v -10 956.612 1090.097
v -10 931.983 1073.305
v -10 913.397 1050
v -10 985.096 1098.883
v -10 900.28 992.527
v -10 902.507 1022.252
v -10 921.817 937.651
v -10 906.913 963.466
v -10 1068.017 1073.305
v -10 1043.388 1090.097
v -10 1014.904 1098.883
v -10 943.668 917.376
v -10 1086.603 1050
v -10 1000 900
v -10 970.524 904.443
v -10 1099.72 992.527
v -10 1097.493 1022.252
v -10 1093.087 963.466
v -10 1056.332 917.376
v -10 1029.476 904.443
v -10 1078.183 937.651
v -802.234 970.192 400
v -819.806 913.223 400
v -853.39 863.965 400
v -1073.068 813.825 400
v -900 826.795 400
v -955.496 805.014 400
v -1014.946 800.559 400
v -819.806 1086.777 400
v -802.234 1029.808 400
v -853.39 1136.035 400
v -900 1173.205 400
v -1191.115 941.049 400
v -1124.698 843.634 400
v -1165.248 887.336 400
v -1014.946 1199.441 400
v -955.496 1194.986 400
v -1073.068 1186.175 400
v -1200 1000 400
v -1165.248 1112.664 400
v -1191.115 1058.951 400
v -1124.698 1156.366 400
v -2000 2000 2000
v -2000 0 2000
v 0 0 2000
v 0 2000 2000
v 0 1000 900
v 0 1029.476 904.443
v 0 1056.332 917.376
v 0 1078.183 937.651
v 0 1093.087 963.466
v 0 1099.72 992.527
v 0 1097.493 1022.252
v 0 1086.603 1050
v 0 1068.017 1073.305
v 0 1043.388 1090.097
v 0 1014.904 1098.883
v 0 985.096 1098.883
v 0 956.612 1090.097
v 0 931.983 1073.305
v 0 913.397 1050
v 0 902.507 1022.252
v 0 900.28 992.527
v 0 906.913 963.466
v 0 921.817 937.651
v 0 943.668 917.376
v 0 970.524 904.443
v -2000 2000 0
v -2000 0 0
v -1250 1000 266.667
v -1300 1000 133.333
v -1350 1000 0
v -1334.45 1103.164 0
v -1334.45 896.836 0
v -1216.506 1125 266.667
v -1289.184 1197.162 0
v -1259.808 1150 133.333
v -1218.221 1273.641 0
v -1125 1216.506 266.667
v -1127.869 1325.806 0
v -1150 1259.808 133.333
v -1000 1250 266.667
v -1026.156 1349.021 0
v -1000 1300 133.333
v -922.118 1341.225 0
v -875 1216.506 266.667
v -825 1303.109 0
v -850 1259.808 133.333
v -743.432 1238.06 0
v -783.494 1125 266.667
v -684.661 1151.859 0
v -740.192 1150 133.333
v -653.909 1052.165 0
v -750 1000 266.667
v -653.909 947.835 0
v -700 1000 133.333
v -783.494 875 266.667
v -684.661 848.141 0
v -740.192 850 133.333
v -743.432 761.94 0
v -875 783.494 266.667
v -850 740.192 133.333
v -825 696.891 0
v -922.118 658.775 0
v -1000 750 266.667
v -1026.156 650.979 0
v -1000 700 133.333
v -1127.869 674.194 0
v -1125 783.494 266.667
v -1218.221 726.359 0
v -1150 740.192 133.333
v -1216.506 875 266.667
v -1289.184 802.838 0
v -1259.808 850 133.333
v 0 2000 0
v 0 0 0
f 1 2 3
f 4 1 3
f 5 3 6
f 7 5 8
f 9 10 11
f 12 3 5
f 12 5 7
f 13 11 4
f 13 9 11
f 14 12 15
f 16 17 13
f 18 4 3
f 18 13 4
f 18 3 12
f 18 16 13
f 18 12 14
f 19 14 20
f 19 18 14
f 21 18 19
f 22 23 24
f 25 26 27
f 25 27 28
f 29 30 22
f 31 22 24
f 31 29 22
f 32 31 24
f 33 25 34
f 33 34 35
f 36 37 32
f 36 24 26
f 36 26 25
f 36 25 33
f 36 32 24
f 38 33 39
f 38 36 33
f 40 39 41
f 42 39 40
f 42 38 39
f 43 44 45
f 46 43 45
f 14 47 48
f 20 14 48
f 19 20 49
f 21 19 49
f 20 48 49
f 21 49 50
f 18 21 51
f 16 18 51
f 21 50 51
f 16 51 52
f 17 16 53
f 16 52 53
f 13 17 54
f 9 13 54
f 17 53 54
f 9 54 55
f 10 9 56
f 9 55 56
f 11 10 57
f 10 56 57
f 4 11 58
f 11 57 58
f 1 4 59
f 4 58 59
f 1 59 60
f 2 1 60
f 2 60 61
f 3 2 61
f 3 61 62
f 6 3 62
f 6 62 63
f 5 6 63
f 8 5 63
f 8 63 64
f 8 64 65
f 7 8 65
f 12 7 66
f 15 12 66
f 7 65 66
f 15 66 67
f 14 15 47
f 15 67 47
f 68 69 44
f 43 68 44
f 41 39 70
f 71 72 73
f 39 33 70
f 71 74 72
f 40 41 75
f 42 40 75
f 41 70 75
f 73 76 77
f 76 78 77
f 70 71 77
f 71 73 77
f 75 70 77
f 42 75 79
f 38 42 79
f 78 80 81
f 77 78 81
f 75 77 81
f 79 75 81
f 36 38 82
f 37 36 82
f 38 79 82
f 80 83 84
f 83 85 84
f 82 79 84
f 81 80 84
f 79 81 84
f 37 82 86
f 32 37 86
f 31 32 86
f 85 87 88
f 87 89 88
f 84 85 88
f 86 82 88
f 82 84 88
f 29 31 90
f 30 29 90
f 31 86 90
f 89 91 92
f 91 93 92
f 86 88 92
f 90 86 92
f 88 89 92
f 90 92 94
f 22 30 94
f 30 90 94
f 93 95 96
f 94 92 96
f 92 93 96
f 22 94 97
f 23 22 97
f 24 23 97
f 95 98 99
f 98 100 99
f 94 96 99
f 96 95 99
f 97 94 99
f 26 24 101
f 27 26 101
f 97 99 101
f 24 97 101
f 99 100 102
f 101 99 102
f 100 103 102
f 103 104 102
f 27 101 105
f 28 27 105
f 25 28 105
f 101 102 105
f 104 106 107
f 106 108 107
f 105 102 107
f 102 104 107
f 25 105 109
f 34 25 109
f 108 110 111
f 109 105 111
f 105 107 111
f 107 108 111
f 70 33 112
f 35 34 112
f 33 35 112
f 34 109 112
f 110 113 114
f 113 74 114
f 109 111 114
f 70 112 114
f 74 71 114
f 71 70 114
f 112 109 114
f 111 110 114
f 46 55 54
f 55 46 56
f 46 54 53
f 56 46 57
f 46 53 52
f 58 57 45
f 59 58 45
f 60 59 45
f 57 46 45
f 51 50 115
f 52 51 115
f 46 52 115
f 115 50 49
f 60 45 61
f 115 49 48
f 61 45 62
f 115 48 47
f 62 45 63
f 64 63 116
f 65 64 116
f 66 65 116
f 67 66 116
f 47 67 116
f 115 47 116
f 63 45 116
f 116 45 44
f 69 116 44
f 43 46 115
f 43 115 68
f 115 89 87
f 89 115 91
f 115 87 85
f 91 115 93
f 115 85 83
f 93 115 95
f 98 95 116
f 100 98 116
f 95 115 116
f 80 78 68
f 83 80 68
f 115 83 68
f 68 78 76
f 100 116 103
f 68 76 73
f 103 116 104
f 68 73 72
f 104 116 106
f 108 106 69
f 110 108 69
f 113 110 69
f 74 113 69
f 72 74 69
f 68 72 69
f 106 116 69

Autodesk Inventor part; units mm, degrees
ref_plane "YZ Plane" through (0, 0, 0) normal (1, 0, 0) x (0, 1, 0)
ref_plane "XZ Plane" through (0, 0, 0) normal (0, 1, 0) x (-1, 0, 0)
ref_plane "XY Plane" through (0, 0, 0) normal (0, 0, 1) x (1, 0, 0)
sketch "スケッチ1" plane through (0, 0, 0) normal (0, 1, 0) x (-1, 0, 0)
  line L0 (2000, 2000) -> (0, 2000)
  line L1 (0, 2000) -> (0, 0)
  line L2 (0, 0) -> (2000, 0)
  line L3 (2000, 0) -> (2000, 2000)
  dimension "d0" = 2000
  dimension "d1" = 2000
extrude "押し出し1" add sketch "スケッチ1" along normal blind 2000
sketch "スケッチ2" plane through (0, 0, 0) normal (0, 0, -1) x (-1, 0, 0)
  circle A0 centre (1000, 1000) radius 350
  line L0 (2000, 2000) -> (0, 2000) construction
  line L1 (1000, 2000) -> (1000, 1000) construction
  line L2 (1000, 1000) -> (2000, 1000) construction
  line L3 (2000, 0) -> (2000, 2000) construction
  point P0 (0, 0)
  dimension "d4" = 700
ref_plane "作業平面1" through (0, 0, 400) normal (0, 0, -1) x (-1, 0, 0)
sketch "スケッチ3" plane through (0, 0, 400) normal (0, 0, -1) x (-1, 0, 0)
  circle A0 centre (1000, 1000) radius 200
  point P0 (0, 0)
  dimension "d6" = 400
loft "ロフト1" cut profiles "スケッチ2", "スケッチ3"
sketch "スケッチ4" plane through (0, 0, 2000) normal (1, 0, 0) x (0, 0, -1)
  circle A0 centre (1000, 1000) radius 100
  line L0 (0, 0) -> (0, 2000) projected
  line L1 (0, 0) -> (2000, 0) projected
  dimension "d11" = 200
  dimension "d12" = 1000
  dimension "d13" = 1000
extrude "押し出し2" cut sketch "スケッチ4" against normal blind 10
properties part number "hako" material "アルミニウム 6061"
